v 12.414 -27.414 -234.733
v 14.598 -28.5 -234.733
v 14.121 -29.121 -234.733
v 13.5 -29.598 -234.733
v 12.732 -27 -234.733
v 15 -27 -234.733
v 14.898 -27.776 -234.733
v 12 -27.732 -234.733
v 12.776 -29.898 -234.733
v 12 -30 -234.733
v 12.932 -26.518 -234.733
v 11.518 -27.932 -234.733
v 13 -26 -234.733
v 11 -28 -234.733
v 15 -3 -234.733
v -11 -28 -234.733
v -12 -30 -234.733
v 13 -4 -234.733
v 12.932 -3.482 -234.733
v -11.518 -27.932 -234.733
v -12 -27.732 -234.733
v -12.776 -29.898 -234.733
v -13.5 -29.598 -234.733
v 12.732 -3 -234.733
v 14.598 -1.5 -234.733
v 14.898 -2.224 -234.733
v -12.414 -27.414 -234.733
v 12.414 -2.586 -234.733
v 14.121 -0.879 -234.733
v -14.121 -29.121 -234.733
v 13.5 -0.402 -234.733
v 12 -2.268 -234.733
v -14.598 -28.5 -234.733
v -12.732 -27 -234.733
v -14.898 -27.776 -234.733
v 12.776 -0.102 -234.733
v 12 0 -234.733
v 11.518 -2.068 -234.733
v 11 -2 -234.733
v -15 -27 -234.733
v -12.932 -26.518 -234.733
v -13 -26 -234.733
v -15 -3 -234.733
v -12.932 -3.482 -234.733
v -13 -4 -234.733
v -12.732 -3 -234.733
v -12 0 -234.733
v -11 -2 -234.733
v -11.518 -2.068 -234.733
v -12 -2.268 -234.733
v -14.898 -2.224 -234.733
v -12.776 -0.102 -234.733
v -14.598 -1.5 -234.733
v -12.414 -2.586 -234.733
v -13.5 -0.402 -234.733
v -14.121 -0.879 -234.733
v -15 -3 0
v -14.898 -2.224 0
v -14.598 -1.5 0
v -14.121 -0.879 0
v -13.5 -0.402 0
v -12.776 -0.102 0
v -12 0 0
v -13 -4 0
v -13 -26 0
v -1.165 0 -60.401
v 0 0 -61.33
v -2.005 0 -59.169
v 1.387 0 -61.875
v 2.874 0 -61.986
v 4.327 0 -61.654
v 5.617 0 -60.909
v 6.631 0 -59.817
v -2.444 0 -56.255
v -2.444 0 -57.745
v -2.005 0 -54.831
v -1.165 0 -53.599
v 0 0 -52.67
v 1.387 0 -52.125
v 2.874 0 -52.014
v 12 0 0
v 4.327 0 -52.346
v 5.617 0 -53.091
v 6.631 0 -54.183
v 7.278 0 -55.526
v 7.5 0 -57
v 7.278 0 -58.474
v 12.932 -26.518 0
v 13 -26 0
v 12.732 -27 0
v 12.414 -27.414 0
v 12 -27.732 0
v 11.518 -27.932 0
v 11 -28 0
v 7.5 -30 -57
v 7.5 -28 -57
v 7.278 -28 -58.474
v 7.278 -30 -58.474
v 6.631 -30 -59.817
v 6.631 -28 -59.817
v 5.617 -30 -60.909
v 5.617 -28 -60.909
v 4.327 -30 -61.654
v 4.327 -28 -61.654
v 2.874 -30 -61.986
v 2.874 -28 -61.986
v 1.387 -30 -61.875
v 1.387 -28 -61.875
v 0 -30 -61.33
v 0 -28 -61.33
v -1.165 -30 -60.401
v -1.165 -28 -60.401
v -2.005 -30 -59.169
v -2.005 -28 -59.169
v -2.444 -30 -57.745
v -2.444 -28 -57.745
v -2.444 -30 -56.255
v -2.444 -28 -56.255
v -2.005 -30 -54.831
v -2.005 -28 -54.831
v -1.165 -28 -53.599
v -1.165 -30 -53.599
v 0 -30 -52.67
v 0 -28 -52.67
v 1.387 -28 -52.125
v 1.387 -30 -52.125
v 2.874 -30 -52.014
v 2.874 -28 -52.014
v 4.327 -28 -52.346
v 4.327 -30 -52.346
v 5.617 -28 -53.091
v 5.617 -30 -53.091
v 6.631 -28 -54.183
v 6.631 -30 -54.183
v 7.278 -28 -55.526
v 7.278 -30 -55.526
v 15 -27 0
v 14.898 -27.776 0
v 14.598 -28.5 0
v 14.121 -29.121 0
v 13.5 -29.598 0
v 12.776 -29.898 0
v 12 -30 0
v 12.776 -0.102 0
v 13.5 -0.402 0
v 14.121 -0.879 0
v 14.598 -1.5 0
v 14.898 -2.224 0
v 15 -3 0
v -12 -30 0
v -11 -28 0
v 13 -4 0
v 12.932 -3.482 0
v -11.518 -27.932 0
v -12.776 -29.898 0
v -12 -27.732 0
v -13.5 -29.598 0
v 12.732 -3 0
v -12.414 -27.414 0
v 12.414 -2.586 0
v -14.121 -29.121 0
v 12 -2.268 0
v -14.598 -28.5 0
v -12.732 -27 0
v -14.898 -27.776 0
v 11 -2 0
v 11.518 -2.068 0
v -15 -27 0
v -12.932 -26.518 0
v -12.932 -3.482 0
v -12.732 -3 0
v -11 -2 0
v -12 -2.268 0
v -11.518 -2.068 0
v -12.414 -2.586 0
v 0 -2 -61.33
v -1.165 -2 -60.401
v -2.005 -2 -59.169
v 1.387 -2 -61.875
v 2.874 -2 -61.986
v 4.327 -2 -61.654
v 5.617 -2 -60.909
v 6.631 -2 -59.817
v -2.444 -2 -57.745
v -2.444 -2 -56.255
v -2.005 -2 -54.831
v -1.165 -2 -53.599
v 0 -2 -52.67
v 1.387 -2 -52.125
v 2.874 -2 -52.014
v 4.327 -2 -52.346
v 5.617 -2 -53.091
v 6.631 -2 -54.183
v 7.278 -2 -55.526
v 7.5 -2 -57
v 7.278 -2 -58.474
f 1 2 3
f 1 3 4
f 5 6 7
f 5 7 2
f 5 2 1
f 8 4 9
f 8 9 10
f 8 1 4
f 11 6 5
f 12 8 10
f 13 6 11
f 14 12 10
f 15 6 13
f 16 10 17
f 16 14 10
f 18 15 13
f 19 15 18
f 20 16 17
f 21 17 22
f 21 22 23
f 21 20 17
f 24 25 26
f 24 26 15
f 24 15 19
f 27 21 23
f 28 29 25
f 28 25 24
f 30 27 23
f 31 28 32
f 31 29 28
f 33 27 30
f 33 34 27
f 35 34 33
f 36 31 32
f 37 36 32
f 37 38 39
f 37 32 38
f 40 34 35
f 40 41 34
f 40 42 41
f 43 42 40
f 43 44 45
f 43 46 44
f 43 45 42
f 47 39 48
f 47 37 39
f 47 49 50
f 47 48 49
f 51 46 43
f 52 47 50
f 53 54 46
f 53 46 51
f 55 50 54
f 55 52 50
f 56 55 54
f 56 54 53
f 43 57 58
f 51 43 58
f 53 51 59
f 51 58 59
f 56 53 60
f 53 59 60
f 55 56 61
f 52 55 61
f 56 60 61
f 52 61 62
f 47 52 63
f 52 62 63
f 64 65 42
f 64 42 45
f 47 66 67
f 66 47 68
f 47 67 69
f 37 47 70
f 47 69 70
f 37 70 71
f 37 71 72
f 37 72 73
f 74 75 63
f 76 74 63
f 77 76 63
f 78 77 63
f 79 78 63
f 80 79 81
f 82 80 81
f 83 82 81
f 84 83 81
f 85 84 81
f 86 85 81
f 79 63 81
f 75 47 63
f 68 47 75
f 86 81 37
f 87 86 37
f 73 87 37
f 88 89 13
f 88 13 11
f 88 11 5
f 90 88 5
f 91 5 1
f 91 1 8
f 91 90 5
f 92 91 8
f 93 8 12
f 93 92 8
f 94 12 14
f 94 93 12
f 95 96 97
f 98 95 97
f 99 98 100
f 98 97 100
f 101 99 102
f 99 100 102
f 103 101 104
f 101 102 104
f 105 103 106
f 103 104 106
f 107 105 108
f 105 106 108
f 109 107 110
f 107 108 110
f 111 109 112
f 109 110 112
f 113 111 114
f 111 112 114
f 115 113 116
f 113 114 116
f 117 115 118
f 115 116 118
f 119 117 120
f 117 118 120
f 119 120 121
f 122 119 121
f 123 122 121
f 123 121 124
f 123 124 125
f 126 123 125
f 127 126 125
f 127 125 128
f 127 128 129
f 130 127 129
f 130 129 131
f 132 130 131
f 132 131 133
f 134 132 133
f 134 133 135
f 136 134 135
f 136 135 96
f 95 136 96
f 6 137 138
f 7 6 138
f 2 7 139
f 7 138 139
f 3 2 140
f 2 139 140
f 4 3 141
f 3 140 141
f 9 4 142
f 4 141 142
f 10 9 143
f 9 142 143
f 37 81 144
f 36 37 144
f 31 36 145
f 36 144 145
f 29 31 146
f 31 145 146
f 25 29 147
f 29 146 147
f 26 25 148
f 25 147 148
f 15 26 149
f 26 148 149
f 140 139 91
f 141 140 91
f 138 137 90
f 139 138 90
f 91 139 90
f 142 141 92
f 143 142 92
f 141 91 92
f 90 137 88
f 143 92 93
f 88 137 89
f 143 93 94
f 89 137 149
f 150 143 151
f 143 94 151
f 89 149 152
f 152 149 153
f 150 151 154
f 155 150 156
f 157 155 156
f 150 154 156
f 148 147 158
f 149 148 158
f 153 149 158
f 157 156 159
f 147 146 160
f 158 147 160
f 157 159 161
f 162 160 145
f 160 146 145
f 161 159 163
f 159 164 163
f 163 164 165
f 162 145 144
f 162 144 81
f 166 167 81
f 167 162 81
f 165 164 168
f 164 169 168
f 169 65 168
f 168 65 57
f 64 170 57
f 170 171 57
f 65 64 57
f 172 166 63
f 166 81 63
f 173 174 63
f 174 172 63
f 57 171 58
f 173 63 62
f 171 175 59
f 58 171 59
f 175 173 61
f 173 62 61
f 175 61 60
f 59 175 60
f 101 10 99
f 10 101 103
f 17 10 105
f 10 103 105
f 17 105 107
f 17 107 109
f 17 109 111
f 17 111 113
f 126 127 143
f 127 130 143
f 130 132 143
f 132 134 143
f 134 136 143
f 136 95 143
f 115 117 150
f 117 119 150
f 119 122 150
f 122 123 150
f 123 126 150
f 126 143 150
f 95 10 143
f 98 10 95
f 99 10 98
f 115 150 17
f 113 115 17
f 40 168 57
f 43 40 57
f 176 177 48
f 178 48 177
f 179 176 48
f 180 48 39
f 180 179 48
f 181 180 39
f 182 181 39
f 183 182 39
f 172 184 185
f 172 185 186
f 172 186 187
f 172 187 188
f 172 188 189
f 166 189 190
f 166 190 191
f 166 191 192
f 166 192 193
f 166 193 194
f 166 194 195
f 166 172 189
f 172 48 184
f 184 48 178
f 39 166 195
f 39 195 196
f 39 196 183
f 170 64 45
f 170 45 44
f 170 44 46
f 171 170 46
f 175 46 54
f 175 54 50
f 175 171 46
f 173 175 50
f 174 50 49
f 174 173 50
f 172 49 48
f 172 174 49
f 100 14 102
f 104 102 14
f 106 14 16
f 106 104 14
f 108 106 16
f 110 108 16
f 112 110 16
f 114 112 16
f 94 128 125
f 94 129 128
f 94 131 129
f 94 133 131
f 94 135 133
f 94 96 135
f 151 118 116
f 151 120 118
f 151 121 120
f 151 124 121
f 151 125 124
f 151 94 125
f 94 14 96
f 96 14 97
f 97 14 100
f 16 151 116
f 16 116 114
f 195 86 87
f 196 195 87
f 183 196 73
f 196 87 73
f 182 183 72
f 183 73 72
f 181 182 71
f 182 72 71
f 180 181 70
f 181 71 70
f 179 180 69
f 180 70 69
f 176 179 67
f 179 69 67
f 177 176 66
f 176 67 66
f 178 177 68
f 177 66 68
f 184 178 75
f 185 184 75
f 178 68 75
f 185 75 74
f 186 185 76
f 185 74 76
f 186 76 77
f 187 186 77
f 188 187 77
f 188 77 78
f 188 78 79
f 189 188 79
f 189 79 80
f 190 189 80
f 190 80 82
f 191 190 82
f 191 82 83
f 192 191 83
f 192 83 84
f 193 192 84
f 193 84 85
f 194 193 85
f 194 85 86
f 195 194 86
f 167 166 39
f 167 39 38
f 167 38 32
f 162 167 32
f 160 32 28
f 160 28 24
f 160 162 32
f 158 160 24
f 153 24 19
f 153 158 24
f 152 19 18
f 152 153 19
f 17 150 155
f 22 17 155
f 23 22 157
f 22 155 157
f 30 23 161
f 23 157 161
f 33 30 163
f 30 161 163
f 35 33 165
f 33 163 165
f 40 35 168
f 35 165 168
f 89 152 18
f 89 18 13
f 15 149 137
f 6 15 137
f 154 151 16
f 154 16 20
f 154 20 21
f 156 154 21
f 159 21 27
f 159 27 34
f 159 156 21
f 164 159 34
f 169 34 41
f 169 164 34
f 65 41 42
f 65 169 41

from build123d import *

# Parameters (mm, degrees)
EXTRUDE_1_DEPTH     = 234.733197
SKETCH_2_R          = 5
CUT_EXTRUDE_1_DEPTH = 31


with BuildPart() as part:
    # Эскиз1 → Бобышка-Вытянуть1 (new body)
    with BuildSketch(Plane.XY):
        with BuildLine():
            Line((-12, 0), (12, 0))
            ThreePointArc((12, 0), (14.121320344, -0.878679656), (15, -3))
            Line((15, -3), (15, -27))
            ThreePointArc((15, -27), (14.121320344, -29.121320344), (12, -30))
            Line((12, -30), (-12, -30))
            ThreePointArc((-12, -30), (-14.121320344, -29.121320344), (-15, -27))
            Line((-15, -27), (-15, -3))
            ThreePointArc((-15, -3), (-14.121320344, -0.878679656), (-12, 0))
        make_face()
        with BuildLine():
            Line((-11, -2), (11, -2))
            ThreePointArc((11, -2), (12.414213562, -2.585786438), (13, -4))
            Line((13, -4), (13, -26))
            ThreePointArc((13, -26), (12.414213562, -27.414213562), (11, -28))
            Line((11, -28), (-11, -28))
            ThreePointArc((-11, -28), (-12.414213562, -27.414213562), (-13, -26))
            Line((-13, -26), (-13, -4))
            ThreePointArc((-13, -4), (-12.414213562, -2.585786438), (-11, -2))
        make_face(mode=Mode.SUBTRACT)
    extrude(amount=-EXTRUDE_1_DEPTH)

    # Эскиз2 → Вырез-Вытянуть1 (cut, through all)
    with BuildSketch(Plane(origin=(0, 0, 0), x_dir=(1, 0, 0), z_dir=(0, 1, 0))):
        with Locations((2.5, 57)):
            Circle(SKETCH_2_R)
    extrude(amount=-CUT_EXTRUDE_1_DEPTH, mode=Mode.SUBTRACT)


solid = part.part
